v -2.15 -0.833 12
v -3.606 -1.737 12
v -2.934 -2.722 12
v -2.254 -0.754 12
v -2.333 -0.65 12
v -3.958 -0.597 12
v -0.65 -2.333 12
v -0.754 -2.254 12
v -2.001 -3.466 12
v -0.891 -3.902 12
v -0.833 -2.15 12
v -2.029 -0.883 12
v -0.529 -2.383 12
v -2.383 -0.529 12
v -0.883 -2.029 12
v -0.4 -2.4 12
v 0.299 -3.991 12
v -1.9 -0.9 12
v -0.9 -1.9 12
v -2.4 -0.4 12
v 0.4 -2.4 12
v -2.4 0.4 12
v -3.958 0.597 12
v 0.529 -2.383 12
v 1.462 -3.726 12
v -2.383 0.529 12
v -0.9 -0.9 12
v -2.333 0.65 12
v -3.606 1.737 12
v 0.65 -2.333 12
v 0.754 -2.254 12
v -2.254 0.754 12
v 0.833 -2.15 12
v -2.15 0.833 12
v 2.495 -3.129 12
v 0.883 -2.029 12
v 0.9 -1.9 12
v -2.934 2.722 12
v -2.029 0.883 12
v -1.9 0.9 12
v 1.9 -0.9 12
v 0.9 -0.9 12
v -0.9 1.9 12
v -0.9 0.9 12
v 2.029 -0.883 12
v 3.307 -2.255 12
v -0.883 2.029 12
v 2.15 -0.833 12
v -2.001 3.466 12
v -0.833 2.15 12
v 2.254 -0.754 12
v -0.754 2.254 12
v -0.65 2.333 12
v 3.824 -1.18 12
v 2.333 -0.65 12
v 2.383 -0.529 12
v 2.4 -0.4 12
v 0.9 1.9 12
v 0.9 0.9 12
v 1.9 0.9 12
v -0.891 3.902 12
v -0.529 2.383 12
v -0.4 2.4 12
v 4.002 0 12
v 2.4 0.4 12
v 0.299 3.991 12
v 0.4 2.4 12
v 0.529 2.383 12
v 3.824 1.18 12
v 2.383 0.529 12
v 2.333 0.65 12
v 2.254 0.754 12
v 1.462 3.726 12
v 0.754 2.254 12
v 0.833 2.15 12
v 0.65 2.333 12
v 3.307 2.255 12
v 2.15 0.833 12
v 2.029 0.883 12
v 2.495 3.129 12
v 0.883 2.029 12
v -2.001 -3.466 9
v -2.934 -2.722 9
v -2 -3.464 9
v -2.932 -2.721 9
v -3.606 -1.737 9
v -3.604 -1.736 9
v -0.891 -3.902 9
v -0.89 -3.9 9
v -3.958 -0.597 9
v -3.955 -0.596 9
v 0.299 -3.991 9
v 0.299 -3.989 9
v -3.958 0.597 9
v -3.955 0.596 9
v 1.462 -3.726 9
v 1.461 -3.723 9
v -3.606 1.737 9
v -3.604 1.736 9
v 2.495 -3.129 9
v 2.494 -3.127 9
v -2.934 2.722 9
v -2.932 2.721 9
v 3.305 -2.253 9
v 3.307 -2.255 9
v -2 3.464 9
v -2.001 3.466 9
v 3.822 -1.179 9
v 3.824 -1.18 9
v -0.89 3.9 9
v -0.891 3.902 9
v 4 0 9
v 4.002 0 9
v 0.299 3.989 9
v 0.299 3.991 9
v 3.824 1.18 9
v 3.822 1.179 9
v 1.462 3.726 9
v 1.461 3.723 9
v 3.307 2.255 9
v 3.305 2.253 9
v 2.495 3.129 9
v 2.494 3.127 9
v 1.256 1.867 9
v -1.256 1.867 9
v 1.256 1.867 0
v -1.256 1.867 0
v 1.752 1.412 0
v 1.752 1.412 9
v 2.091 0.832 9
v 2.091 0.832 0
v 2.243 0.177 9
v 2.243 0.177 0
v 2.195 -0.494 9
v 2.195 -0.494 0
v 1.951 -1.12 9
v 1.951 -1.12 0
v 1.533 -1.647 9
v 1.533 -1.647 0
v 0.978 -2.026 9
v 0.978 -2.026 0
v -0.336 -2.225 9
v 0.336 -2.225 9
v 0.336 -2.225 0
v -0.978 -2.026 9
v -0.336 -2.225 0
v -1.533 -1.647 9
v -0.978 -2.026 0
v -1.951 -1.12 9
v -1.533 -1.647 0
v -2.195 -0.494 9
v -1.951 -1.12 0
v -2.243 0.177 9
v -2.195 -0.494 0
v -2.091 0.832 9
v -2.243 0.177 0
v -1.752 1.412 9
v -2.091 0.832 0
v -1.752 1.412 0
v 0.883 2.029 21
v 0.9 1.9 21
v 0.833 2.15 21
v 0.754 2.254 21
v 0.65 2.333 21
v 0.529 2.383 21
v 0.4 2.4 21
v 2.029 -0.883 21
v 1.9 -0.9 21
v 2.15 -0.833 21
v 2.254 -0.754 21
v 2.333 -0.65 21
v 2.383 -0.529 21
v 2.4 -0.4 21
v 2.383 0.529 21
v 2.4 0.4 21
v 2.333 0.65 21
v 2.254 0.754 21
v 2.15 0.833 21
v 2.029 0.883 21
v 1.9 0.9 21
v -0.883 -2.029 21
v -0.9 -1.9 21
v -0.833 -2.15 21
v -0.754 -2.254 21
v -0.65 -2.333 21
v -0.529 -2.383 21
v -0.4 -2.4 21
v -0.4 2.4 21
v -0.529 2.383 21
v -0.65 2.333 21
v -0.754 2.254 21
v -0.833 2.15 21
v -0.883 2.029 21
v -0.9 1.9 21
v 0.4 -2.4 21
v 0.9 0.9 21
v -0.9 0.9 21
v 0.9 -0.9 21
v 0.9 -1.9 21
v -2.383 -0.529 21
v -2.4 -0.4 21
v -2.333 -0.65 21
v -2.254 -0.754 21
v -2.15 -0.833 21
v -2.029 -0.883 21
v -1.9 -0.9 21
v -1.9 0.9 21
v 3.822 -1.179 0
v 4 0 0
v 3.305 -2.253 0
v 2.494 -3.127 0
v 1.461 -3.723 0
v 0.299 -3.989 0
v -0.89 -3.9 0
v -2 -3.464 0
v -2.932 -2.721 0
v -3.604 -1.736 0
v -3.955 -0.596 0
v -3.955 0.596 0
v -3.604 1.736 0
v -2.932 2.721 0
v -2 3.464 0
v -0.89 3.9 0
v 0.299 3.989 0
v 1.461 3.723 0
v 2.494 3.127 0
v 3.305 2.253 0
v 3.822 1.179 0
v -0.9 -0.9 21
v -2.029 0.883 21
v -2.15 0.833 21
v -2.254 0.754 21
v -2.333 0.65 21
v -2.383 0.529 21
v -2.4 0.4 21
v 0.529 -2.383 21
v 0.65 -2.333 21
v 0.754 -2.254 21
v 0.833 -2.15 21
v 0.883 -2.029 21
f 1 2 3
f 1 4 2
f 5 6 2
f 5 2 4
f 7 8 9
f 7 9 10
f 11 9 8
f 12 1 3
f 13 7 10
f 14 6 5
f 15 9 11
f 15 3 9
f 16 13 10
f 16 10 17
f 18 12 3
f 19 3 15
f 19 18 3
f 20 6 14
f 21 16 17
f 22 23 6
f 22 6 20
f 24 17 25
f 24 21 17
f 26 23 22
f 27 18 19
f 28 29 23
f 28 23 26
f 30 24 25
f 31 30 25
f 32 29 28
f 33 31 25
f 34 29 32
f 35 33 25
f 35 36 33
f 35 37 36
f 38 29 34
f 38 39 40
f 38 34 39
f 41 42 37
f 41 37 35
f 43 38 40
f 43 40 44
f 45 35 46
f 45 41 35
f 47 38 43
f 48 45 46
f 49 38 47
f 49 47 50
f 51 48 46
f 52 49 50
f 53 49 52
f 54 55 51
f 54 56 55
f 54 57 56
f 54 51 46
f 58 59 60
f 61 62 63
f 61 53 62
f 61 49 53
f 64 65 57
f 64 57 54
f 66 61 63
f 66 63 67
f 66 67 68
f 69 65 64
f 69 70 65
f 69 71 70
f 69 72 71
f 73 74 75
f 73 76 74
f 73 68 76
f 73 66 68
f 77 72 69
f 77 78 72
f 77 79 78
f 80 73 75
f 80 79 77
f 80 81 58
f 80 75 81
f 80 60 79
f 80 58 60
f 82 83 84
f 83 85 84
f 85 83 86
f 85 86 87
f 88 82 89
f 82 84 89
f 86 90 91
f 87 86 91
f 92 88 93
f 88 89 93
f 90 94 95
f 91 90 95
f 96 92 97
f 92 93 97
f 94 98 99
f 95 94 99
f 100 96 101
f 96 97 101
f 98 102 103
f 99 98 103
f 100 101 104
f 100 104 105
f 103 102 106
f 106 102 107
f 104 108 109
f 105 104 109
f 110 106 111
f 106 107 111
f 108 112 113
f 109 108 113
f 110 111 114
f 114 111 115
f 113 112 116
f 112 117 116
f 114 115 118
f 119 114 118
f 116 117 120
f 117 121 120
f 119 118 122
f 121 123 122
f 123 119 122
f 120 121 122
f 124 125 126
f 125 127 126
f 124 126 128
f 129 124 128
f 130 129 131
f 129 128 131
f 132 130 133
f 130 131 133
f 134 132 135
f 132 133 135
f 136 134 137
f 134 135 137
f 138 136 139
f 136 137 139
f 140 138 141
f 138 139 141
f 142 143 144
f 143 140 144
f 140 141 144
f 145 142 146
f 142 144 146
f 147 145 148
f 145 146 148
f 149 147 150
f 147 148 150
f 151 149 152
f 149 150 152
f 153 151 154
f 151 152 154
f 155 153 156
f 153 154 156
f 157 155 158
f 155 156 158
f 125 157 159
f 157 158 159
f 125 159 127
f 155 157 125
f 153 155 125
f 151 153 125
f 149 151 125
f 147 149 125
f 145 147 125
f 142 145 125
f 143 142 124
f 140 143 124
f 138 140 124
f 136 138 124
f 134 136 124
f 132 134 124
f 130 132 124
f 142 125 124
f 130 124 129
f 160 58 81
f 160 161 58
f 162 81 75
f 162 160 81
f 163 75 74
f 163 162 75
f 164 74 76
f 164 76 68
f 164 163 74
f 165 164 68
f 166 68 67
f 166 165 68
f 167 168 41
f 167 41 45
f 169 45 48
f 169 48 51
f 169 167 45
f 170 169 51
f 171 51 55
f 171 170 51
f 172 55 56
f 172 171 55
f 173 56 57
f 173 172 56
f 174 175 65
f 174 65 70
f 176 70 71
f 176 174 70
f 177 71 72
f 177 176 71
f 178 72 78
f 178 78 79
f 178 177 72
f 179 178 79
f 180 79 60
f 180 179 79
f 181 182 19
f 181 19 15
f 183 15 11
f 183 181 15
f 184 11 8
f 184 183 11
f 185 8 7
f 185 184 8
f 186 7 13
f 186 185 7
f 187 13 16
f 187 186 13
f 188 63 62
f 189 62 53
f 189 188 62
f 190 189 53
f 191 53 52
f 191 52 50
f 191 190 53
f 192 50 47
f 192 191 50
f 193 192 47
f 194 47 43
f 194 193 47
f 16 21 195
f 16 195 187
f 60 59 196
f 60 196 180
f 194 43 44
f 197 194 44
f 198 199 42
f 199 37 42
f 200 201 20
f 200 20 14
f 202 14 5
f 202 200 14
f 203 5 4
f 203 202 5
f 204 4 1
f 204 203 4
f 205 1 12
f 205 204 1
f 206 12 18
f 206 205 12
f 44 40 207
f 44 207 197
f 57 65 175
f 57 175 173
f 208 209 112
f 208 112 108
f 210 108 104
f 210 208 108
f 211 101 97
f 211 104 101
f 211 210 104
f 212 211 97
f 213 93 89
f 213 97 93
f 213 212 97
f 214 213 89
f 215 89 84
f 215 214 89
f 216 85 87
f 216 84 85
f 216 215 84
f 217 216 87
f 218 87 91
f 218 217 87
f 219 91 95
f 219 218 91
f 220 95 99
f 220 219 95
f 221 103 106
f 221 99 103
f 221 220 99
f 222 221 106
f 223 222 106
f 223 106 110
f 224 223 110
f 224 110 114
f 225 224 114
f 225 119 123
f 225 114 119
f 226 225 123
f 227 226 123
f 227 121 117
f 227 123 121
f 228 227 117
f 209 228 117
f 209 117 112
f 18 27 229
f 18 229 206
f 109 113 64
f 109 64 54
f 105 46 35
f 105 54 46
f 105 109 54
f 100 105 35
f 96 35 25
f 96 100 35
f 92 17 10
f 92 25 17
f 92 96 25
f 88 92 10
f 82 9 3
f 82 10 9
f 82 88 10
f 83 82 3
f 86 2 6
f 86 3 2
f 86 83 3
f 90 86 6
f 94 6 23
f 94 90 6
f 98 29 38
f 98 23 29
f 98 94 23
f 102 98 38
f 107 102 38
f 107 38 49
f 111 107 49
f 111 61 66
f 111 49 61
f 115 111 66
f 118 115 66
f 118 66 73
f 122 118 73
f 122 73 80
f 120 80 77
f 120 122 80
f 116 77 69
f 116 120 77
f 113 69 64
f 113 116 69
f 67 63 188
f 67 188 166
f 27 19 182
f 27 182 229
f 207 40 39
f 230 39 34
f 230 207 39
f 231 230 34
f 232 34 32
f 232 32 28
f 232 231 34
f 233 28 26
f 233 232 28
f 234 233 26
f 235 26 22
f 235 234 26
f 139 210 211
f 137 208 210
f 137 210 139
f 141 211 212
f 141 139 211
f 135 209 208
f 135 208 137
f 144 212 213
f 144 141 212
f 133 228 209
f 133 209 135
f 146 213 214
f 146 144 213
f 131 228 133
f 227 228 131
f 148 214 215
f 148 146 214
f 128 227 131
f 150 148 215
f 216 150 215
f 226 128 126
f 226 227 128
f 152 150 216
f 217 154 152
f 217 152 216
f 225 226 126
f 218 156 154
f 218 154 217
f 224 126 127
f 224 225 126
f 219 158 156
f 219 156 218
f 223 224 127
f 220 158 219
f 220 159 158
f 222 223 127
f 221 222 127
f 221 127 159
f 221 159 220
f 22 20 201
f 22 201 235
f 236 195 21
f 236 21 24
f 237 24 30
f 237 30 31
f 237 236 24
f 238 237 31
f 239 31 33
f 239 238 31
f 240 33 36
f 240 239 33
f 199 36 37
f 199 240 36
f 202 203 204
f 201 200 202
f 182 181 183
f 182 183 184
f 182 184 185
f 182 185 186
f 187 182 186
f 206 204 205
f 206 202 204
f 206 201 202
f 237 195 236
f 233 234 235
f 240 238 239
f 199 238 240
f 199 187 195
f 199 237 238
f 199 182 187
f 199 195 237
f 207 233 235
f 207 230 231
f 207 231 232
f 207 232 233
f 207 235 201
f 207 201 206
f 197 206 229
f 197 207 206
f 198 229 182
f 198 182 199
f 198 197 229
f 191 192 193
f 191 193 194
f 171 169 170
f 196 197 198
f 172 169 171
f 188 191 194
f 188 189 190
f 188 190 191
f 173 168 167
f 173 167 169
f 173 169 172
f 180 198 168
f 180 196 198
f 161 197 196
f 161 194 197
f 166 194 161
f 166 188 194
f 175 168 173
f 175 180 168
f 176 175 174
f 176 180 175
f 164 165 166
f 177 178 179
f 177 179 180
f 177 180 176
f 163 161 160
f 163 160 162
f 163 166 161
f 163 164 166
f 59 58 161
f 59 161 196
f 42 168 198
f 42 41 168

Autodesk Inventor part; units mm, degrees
ref_plane "YZ Plane" through (0, 0, 0) normal (1, 0, 0) x (0, 1, 0)
ref_plane "XZ Plane" through (0, 0, 0) normal (0, 1, 0) x (-1, 0, 0)
ref_plane "XY Plane" through (0, 0, 0) normal (0, 0, 1) x (1, 0, 0)
sketch "Sketch1" plane through (0, 0, 0) normal (0, 0, 1) x (1, 0, 0)
  circle A0 centre (0, 0) radius 2.25
  circle A1 centre (0, 0) radius 4
  dimension "d0" = 4.5
  dimension "d1" = 8
extrude "Extrusion1" add sketch "Sketch1" along normal blind 9
sketch "Sketch2" plane through (0, 0, 9) normal (0, 0, 1) x (1, 0, 0)
  circle A0 centre (0, 0) radius 4.0023
extrude "Extrusion2" add sketch "Sketch2" along normal blind 3
sketch "Sketch3" plane through (0, 0, 12) normal (0, 0, 1) x (1, 0, 0)
  line L0 (2.4, 0.9) -> (2.4, -0.9)
  line L1 (-2.4, -0.9) -> (-2.4, 0.9)
  line L2 (-0.9, 2.4) -> (0.9, 2.4)
  line L3 (0.9, -2.4) -> (-0.9, -2.4)
  line L4 (-0.9, 2.4) -> (-0.9, 0.9)
  line L5 (-0.9, -2.4) -> (-0.9, -0.9)
  line L6 (0.9, 2.4) -> (0.9, 0.9)
  line L7 (0.9, -2.4) -> (0.9, -0.9)
  line L8 (2.4, -0.9) -> (0.9, -0.9)
  line L9 (-0.9, -0.9) -> (-2.4, -0.9)
  line L10 (-2.4, 0.9) -> (-0.9, 0.9)
  line L11 (0.9, 0.9) -> (2.4, 0.9)
  point P0 (0, 0)
  dimension "d6" = 4.8
  dimension "d7" = 1.8
  dimension "d8" = 2.4
  dimension "d10" = 1.8
  dimension "d11" = 4.8
  dimension "d12" = 2.4
extrude "Extrusion3" add sketch "Sketch3" along normal blind 9
fillet "Fillet1" radius 0.5 2 edges at (-0.9, 2.4, 16.5) (-2.4, 0.9, 16.5)
fillet "Fillet2" radius 0.5 1 edges at (-2.4, -0.9, 16.5)
fillet "Fillet3" radius 0.5 1 edges at (-0.9, -2.4, 16.5)
fillet "Fillet4" radius 0.5 4 edges at (0.9, 2.4, 16.5) (2.4, 0.9, 16.5) (2.4, -0.9, 16.5) (0.9, -2.4, 16.5)
sketch "Sketch5" plane through (0, 0, 0) normal (0, 0, -1) x (-1, 0, 0)
  line L0 (1.2561, 1.8667) -> (-1.2561, 1.8667)
  arc A0 (1.2561, 1.8667) -> (-1.2561, 1.8667) centre (0, 0) ccw
  point P0 (0, 0)
extrude "Extrusion4" add sketch "Sketch5" against normal blind 10
properties part number "Motor_Axle_Adapter"
